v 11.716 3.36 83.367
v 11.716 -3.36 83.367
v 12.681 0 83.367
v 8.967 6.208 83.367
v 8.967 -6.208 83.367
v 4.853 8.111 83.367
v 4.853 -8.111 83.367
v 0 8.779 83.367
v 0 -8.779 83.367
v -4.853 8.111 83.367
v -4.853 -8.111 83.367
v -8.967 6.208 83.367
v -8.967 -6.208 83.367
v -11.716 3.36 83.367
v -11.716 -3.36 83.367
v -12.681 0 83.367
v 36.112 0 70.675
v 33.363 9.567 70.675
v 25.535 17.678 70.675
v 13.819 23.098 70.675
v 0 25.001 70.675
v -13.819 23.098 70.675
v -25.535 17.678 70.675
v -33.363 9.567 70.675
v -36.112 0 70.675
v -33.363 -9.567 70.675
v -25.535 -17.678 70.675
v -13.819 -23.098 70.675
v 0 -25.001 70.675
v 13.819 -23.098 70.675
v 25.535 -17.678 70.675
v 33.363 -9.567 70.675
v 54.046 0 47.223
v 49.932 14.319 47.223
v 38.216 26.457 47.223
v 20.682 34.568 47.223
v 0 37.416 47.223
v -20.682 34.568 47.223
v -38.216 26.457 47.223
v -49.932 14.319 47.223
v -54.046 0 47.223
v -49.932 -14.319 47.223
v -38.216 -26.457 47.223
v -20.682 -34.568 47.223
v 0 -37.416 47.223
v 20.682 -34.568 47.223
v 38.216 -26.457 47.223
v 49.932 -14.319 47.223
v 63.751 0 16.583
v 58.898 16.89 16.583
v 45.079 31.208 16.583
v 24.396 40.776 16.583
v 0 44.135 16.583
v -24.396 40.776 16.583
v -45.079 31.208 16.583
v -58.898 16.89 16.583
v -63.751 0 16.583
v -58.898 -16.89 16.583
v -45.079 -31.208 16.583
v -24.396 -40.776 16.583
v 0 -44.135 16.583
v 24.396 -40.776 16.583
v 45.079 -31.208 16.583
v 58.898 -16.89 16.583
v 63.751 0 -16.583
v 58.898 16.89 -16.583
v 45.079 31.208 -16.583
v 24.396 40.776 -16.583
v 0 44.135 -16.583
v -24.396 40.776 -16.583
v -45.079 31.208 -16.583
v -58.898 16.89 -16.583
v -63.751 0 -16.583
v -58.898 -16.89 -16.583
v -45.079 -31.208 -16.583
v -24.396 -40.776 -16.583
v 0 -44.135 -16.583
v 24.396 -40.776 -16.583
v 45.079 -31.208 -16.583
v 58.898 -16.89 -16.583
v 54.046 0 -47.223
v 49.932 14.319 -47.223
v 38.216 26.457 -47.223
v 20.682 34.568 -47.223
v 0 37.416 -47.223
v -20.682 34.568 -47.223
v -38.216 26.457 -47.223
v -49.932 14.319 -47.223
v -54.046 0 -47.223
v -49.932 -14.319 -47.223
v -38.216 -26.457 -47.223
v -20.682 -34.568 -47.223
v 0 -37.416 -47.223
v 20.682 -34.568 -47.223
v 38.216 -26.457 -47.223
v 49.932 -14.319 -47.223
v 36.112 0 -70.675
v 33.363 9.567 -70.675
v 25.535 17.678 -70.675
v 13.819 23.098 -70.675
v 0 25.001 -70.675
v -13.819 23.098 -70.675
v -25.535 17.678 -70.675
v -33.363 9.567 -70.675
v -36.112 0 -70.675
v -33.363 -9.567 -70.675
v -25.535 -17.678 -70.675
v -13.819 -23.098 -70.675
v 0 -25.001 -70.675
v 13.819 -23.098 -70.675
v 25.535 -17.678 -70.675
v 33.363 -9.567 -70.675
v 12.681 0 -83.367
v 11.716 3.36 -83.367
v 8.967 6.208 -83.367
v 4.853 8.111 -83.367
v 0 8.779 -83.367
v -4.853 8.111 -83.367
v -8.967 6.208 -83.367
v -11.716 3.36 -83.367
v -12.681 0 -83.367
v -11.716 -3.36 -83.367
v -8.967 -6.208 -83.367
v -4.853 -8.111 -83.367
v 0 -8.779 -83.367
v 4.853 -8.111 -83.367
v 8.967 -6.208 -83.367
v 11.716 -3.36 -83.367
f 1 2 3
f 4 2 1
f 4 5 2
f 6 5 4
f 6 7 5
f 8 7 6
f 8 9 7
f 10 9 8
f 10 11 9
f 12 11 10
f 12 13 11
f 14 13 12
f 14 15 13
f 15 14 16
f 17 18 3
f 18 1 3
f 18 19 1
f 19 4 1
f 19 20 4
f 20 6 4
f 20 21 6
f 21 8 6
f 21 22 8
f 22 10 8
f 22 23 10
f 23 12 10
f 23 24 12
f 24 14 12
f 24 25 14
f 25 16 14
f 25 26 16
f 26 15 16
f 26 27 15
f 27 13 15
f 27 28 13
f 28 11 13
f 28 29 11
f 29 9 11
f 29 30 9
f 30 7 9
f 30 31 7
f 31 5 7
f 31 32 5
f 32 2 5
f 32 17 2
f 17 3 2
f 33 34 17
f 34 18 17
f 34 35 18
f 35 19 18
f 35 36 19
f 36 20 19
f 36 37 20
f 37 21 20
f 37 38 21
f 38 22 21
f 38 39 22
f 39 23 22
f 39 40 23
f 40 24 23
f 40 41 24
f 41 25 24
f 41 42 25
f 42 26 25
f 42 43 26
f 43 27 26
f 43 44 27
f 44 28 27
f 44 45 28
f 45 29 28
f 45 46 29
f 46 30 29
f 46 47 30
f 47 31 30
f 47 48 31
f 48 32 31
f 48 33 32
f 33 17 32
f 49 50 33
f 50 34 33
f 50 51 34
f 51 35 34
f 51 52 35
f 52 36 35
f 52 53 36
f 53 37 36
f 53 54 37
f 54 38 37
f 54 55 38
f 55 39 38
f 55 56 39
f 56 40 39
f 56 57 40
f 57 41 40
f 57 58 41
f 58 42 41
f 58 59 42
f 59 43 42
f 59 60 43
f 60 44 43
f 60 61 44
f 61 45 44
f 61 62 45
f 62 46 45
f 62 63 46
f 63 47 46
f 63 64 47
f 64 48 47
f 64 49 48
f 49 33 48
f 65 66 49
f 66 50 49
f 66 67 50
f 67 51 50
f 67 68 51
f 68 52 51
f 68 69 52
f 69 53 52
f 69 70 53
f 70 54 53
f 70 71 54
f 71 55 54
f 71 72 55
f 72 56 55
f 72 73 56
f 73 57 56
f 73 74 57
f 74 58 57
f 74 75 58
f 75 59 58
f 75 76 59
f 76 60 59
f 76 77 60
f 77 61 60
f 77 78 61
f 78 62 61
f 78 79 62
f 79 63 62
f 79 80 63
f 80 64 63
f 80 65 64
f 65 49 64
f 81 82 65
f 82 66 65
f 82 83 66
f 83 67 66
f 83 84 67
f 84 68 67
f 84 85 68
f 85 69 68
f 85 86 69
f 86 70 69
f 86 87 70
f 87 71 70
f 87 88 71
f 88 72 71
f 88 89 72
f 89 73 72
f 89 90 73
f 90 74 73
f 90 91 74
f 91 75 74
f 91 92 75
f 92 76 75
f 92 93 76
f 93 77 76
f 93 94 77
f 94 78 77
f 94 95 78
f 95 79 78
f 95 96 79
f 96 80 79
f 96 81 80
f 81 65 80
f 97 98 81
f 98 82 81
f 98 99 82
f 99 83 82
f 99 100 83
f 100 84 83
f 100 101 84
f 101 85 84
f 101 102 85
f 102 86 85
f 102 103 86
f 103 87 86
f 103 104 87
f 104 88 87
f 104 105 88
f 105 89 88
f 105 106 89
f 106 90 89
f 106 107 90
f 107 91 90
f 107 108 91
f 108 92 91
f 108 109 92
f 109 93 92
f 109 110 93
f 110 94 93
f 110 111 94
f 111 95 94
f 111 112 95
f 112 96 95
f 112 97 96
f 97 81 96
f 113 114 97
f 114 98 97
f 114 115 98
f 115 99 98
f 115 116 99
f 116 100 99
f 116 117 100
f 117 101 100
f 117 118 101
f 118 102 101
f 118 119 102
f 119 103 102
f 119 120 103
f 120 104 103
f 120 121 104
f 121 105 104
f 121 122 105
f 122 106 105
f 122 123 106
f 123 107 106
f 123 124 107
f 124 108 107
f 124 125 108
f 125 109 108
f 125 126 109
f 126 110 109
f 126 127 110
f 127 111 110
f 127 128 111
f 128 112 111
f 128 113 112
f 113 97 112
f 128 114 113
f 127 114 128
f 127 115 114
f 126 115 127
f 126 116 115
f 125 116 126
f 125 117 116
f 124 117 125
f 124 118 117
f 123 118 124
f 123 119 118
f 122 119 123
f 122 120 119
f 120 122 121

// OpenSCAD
// Generated by SolidPython 1.0.1 on 2020-07-29 00:46:50


scale(v = [13, 9, 17]) {
	sphere(r = 5);
}
/***********************************************
*********      SolidPython code:      **********
************************************************
 
# import packages: SolidPython
from solid import *
from solid.utils import *
from itertools import chain, combinations, permutations


class Resize:

    def __init__(self, scad_file):
        self.scad_file = scad_file
        #self.scad_file = import_scad(scad_file)
        # cone/cylinder param:
        self.r1 = 0
        self.r2 = 0
        self.h = 0
        # rectangular prism param:
        self.w = 0
        self.l = 0
        # ellipse param:
        self.r = 0

    # import OpenScad code (file name corresponds to shape)


    # classify shape + parameters
    def assign(self, param1, param2, param3):
        if self.scad_file == 'cone.scad':
            self.r1 = param1
            self.r2 = param2
            self.h = param3
        elif self.scad_file == 'cylinder.scad':
            self.r1 = param1
            self.r2 = param2
            self.h = param3
        elif self.scad_file == 'rectangularPrism.scad':
            self.h = param1
            self.l = param2
            self.w = param3
        else:
            self.r = param1
            self.h = param2

    # resize parameters
    def iterate(self):
        x = range(3, 20, 2)
        i = 1
        if self.scad_file == 'cone.scad':
            tempList = list(permutations(x, 2))
            for temp in tempList:
                param1 = temp[0]
                param2 = temp[1]
                filepath = 'produced_scad_files/' + 'cone' + str(param1) + '_' + str(param2) + '_' + '.scad'
                scad_render_to_file(cylinder(h=param1, r1=param2, r2=0), filepath)

        elif self.scad_file == 'cylinder.scad':
            tempList = list(permutations(x, 3))
            for temp in tempList:
                param1 = temp[0]
                param2 = temp[1]
                filepath = 'produced_scad_files/' + 'cylinder' + str(param1) + '_' + str(param2) + '_' + '.scad'
                scad_render_to_file(cylinder(h=param1, r1=param2, r2=param2), filepath)

        elif self.scad_file == 'rectangularPrism.scad':
            tempList = list(permutations(x, 3))
            for temp in tempList:
                param1 = temp[0]
                param2 = temp[1]
                param3 = temp[2]
                filepath = 'produced_scad_files/' + 'rectangularPrism' + str(param1) + '_' + str(param2) + '_' + str(
                    param3) + '.scad'
                scad_render_to_file(cube(size=(param1, param2, param3)), filepath)

        elif self.scad_file == 'ellipse.scad':
            tempList = list(permutations(x, 4))
            for temp in tempList:
                param1 = temp[0]
                param2 = temp[1]
                param3 = temp[2]
                param4 = temp[3]
                filepath = 'produced_scad_files/' + 'ellipse' + str(param1) + '_' + str(param2) + '_' + str(param3) + '_' + str(param4) + '.scad'
                scad_render_to_file(scale([param1, param2, param3])(sphere(r=param4)), filepath)

    def render_to_scadfile(self):
        scad_render_to_file(scad, 'example.scad') 
 
************************************************/
